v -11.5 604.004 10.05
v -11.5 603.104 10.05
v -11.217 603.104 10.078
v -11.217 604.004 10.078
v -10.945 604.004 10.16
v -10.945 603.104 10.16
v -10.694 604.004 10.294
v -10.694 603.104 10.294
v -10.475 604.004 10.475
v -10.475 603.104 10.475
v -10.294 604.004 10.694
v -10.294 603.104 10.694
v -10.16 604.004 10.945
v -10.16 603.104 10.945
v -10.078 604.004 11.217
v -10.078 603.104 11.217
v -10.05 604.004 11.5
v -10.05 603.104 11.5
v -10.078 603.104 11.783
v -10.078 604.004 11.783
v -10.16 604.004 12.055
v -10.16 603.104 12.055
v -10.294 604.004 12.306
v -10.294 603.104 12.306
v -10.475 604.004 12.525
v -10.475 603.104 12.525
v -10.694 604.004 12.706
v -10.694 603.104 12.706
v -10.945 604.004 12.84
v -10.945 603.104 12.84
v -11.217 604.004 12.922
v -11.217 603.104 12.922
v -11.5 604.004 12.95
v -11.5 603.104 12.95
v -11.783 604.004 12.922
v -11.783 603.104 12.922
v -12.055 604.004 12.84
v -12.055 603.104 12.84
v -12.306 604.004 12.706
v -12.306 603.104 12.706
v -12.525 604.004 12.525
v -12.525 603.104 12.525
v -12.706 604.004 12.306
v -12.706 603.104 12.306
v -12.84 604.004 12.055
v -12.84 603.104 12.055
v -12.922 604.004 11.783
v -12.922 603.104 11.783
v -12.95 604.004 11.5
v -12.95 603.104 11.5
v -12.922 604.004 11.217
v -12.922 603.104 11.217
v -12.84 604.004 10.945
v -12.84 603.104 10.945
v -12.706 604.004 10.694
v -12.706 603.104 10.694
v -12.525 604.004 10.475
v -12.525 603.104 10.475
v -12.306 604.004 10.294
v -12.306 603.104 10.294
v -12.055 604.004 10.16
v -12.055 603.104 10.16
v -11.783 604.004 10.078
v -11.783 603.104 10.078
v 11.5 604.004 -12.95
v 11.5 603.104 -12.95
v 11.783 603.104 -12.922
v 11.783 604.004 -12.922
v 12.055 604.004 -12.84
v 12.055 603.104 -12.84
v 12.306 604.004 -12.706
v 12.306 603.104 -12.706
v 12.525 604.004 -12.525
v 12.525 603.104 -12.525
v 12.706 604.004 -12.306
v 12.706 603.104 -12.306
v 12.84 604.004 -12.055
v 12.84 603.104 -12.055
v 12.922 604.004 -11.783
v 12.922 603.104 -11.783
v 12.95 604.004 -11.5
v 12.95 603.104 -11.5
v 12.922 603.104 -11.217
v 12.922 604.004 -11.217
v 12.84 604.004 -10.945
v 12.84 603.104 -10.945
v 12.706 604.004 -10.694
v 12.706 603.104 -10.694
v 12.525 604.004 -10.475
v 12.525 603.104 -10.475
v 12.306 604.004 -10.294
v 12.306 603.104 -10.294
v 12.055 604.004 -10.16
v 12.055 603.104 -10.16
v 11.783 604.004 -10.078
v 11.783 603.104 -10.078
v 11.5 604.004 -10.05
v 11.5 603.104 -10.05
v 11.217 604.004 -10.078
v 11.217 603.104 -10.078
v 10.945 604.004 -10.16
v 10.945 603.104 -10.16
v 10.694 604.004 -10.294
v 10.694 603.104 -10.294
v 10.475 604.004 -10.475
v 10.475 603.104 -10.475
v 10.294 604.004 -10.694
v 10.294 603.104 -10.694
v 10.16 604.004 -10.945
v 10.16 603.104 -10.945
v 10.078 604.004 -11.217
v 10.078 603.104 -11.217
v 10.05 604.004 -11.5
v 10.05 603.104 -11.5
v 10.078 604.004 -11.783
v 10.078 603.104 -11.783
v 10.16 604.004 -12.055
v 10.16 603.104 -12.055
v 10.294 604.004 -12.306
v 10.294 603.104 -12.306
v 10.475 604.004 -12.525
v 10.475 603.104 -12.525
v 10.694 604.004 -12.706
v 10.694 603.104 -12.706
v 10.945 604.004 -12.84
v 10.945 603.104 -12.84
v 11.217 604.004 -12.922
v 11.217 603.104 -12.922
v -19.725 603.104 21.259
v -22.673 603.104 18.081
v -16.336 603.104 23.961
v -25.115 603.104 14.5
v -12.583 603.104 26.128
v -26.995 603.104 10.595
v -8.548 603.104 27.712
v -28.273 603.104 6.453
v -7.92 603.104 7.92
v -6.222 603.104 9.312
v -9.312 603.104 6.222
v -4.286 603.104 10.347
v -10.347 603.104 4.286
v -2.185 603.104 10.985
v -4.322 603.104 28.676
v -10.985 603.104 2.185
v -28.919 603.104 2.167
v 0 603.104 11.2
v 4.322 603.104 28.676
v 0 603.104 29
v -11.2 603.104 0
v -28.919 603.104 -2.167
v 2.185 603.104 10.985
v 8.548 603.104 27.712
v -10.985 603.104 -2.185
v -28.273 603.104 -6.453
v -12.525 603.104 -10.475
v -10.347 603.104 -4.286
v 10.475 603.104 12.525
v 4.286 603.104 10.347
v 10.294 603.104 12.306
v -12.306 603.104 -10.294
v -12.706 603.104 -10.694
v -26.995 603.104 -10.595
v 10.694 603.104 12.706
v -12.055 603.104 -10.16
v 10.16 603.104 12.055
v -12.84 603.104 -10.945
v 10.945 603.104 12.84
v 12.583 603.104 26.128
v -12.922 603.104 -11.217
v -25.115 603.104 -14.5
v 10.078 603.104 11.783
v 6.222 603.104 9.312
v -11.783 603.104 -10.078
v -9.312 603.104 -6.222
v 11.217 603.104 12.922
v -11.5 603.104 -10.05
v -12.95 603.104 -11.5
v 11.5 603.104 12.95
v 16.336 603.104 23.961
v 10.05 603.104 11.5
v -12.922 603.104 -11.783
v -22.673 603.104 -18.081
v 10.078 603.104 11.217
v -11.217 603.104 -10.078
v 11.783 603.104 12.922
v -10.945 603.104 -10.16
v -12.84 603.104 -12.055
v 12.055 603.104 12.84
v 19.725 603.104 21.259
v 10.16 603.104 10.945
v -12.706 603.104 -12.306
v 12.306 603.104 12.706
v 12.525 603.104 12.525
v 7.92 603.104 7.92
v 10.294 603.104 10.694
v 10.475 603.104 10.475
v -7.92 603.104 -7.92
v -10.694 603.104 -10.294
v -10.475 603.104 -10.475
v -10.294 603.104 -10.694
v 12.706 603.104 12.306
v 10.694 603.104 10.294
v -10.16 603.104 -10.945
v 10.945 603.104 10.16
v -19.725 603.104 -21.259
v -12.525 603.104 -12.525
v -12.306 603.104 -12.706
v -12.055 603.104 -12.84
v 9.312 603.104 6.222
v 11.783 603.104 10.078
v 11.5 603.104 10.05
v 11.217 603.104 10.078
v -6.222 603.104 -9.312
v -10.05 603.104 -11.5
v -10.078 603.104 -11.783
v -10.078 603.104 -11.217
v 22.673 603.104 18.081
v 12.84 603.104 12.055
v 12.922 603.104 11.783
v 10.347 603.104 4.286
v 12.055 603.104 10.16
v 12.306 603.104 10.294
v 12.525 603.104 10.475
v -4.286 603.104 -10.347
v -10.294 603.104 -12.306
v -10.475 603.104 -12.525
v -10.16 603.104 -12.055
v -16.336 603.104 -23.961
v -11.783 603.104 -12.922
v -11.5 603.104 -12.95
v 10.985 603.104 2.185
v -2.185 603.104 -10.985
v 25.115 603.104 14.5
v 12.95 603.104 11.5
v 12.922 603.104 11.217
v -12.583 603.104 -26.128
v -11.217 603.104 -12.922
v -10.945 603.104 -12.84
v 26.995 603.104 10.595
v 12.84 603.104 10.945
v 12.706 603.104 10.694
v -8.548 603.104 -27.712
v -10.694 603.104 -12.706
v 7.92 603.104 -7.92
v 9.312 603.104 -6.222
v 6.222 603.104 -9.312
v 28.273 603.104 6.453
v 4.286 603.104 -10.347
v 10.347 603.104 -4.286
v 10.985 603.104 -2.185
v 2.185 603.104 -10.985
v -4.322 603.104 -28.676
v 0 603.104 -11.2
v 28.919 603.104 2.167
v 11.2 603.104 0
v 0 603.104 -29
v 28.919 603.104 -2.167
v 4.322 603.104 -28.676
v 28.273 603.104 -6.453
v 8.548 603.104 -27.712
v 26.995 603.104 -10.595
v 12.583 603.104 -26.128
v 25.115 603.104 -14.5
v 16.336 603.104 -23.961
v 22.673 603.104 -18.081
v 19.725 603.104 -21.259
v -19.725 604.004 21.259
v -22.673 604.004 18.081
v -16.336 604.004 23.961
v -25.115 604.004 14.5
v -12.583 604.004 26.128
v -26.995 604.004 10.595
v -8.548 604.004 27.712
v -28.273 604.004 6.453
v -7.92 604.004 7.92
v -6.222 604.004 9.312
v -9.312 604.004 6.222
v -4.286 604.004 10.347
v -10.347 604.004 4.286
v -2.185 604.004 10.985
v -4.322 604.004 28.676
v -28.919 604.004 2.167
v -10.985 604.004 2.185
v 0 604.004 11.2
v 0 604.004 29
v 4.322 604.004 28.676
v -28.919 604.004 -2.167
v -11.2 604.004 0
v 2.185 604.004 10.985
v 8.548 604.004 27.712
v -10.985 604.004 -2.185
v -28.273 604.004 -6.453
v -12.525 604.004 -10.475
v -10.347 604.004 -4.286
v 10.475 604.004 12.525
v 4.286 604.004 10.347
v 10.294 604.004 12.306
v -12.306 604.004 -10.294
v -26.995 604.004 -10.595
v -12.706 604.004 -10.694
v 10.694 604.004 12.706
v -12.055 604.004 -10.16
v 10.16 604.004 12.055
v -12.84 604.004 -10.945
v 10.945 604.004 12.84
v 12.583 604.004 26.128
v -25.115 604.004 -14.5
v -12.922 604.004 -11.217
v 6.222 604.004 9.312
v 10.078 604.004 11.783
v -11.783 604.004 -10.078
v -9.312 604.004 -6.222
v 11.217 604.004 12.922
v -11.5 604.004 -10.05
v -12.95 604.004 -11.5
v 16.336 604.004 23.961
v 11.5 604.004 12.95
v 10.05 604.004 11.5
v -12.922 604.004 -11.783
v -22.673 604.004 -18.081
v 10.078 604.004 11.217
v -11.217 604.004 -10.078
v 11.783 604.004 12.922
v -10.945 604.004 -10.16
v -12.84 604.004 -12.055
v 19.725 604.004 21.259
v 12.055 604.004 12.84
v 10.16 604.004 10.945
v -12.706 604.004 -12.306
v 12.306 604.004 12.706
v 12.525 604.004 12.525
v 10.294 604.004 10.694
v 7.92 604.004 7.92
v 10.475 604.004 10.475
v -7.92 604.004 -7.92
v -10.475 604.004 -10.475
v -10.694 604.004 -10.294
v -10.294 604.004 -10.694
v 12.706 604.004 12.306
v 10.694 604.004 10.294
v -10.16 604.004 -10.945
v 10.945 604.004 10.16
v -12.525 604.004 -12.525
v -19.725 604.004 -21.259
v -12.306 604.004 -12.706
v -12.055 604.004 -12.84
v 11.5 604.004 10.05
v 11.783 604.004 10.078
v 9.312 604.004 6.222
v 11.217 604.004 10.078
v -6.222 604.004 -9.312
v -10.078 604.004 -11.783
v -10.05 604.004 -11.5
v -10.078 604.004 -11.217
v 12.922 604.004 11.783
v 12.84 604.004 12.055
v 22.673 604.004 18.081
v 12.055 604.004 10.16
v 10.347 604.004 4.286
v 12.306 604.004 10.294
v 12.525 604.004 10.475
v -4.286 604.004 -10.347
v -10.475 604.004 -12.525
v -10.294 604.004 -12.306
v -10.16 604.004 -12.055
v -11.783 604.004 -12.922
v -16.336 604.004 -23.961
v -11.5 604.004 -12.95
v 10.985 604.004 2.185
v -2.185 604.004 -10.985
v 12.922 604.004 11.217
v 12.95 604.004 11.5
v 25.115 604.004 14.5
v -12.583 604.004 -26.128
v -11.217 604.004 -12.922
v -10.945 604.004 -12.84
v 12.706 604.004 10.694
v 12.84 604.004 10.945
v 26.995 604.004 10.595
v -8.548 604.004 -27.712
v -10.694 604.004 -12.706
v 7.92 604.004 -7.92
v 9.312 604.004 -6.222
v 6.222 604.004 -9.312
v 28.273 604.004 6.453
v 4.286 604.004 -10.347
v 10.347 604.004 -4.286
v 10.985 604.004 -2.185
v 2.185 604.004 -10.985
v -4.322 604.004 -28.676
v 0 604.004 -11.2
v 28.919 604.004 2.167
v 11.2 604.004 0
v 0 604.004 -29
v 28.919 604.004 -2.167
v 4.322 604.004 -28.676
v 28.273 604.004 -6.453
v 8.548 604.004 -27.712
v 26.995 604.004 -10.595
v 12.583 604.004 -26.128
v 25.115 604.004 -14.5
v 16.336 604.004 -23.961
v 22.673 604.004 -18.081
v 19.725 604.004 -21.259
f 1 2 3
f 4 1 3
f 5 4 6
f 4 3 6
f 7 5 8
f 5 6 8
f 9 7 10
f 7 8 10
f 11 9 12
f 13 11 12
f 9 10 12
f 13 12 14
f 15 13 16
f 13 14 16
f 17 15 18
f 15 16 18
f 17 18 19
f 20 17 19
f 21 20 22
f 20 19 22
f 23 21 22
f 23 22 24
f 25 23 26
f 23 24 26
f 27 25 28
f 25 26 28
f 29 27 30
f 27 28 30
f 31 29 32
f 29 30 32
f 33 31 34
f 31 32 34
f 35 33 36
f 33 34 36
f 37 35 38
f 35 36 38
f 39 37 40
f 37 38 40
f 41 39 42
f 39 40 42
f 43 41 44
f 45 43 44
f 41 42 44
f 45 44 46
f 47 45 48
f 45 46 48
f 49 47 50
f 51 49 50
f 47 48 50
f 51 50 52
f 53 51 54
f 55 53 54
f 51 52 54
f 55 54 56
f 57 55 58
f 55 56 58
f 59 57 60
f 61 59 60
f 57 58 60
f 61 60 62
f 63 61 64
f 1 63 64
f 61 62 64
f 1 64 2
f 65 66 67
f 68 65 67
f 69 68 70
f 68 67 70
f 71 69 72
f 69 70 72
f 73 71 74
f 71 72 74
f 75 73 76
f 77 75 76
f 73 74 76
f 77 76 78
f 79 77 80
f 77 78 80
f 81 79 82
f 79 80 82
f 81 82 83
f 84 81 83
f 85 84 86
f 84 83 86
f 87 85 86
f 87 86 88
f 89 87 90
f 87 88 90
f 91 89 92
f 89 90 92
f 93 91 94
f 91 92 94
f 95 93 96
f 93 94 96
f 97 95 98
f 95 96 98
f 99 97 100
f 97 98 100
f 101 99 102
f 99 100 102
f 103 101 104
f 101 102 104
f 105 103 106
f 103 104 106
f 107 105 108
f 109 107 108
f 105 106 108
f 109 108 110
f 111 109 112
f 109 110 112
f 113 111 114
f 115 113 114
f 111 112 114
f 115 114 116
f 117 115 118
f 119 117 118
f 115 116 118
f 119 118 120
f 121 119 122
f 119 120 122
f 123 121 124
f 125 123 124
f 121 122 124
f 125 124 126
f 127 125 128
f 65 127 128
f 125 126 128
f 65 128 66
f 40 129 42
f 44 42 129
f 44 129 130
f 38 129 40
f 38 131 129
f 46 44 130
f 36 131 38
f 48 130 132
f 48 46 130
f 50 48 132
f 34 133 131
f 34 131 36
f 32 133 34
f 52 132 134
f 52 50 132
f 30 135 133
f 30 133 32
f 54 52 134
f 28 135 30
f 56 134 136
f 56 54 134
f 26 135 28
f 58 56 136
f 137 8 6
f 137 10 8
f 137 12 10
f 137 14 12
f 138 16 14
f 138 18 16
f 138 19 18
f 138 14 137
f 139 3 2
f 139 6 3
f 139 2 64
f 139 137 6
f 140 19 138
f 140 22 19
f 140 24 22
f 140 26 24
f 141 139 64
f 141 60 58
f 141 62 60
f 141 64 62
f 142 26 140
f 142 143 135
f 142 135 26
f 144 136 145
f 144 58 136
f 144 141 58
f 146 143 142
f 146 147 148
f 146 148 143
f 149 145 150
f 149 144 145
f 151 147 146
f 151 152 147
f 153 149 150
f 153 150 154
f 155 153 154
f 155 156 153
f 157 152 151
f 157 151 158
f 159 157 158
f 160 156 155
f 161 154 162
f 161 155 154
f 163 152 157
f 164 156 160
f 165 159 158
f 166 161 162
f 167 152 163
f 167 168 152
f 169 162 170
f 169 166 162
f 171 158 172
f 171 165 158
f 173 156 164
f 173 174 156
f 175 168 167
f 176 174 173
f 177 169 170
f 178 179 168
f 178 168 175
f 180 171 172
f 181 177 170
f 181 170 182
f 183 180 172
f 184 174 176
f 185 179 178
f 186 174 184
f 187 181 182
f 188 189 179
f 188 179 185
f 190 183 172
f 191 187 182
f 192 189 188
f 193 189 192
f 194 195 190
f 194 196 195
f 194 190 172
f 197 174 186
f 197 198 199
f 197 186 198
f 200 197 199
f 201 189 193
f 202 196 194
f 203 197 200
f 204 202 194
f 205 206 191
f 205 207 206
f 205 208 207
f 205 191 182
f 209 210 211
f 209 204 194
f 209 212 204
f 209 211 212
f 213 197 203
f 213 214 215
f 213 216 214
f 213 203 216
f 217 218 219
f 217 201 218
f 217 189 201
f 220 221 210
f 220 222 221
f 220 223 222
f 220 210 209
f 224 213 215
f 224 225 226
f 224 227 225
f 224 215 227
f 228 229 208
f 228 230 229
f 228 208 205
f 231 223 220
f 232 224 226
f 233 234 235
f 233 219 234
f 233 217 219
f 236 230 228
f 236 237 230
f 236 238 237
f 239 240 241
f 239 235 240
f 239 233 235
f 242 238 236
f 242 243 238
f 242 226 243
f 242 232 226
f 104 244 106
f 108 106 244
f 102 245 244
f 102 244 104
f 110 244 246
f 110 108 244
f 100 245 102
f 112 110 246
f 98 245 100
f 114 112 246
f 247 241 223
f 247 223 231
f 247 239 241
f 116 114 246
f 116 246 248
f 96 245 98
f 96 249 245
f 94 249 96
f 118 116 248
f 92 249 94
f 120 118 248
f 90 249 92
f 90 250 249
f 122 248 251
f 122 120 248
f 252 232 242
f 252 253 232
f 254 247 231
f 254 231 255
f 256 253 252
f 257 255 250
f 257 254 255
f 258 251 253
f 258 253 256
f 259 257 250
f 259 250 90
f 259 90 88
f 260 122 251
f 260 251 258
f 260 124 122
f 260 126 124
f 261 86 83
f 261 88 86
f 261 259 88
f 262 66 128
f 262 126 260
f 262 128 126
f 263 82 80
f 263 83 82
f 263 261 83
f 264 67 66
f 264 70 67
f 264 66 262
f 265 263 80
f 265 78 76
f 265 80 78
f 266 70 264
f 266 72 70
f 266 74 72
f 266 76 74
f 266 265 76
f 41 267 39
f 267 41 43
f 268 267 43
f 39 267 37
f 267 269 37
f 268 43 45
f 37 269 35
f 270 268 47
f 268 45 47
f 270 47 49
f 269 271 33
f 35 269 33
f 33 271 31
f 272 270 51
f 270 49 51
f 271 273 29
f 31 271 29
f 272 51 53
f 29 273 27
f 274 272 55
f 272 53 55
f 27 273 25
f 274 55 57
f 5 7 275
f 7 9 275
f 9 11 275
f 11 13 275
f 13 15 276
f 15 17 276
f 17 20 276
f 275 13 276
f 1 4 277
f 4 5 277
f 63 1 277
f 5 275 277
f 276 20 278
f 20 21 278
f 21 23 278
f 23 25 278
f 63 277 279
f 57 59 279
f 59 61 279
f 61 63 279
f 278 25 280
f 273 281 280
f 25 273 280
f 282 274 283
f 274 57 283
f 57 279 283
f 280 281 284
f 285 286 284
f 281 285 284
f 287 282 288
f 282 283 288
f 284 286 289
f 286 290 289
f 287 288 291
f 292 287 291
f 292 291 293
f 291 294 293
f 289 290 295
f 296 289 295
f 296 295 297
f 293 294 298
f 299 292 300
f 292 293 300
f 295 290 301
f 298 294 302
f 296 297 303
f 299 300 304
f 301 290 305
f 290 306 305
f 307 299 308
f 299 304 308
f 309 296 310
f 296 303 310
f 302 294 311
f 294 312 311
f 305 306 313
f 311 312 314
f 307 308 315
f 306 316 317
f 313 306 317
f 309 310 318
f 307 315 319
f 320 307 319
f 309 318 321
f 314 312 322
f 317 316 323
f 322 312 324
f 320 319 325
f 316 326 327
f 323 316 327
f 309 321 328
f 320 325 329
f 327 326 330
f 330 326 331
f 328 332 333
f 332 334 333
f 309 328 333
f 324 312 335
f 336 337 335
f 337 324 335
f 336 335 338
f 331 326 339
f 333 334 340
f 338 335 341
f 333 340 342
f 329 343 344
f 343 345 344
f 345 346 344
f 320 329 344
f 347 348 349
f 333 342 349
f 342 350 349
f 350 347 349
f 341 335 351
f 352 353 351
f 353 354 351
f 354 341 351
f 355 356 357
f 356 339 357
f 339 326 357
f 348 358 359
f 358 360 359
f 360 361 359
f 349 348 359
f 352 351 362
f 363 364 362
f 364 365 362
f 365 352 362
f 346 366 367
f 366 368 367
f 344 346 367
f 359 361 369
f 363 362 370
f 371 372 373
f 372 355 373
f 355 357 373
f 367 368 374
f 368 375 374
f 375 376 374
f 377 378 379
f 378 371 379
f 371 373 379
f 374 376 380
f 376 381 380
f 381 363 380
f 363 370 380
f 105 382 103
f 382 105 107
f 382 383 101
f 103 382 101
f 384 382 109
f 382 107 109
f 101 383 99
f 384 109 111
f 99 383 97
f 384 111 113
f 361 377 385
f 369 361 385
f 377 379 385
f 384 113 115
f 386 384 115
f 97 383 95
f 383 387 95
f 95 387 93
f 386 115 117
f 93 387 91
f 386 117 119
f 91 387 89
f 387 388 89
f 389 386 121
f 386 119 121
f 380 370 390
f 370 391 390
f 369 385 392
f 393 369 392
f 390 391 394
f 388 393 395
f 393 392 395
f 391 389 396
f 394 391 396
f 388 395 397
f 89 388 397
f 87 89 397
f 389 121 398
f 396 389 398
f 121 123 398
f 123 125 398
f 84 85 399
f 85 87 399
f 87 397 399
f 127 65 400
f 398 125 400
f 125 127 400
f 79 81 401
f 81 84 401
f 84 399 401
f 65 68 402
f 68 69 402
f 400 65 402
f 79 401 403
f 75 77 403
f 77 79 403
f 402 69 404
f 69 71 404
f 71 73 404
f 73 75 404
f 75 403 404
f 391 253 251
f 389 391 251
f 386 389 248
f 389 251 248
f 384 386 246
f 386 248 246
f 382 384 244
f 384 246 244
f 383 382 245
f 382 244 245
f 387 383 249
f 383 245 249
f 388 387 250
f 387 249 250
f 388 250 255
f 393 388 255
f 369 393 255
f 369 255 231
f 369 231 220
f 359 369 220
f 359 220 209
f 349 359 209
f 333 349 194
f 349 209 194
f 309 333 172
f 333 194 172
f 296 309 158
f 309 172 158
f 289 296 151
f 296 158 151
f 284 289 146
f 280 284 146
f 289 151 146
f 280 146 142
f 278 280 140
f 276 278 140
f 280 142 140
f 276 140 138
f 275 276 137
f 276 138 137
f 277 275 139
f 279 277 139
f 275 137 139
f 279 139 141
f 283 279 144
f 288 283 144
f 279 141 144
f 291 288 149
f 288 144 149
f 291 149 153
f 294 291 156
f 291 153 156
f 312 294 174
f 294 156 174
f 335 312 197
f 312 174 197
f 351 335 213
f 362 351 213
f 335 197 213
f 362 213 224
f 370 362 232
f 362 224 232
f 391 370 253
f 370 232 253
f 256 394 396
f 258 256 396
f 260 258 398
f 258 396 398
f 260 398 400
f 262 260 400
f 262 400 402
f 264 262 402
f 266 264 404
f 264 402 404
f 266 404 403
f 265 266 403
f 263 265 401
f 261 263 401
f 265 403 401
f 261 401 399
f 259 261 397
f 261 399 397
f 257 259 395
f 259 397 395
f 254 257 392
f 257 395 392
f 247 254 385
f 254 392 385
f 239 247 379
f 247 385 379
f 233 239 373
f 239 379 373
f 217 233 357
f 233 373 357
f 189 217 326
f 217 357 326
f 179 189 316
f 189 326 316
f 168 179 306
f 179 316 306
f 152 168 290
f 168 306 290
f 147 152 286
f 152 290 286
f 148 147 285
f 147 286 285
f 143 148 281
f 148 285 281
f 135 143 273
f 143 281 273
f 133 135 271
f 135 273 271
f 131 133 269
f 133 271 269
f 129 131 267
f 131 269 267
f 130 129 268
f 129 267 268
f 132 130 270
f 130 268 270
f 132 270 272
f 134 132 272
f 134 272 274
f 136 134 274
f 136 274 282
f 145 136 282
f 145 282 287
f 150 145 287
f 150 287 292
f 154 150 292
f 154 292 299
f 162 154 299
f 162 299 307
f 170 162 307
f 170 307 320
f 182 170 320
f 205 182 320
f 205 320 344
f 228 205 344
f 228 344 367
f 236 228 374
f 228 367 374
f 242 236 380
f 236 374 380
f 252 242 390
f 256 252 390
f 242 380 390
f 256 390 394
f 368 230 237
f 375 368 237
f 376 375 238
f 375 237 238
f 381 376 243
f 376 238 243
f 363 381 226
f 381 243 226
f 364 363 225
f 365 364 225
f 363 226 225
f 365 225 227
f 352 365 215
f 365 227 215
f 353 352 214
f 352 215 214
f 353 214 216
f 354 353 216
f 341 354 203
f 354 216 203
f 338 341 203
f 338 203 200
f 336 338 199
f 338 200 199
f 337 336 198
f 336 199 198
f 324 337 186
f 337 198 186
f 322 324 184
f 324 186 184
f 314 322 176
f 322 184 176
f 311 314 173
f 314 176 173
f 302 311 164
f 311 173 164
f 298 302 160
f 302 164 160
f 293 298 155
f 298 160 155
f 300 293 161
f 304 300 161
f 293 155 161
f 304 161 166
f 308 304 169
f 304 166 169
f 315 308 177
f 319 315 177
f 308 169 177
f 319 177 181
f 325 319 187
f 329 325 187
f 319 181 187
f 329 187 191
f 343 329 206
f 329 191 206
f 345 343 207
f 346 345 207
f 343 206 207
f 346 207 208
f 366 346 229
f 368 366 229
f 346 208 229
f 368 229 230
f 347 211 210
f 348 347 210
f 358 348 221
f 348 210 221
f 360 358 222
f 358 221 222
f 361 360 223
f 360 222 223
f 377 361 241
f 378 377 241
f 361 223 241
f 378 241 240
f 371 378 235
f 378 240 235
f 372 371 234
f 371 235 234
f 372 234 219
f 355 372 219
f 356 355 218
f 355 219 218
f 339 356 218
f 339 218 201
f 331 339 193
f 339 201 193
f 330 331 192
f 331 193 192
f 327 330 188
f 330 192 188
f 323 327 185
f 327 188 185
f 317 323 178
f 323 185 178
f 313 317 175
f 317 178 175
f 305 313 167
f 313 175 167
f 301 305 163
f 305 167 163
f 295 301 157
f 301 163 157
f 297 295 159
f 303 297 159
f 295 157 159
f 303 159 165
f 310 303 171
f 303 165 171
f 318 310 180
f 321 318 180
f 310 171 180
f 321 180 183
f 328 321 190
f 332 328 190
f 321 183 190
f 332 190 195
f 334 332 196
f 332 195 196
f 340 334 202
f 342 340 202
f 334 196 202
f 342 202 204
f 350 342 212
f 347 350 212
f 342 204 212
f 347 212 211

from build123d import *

# Parameters (mm, degrees)
SKETCH_1_R          = 29
EXTRUDE_1_DEPTH     = 0.9
SKETCH_2_R          = 1.45
SKETCH_2_R_2        = 11.2
CUT_EXTRUDE_1_DEPTH = 0.9


with BuildPart() as part:
    # 草图1 → 凸台-拉伸1 (new body)
    with BuildSketch(Plane.XZ.offset(-604.003613165)):
        with Locations(Location((0, 0, 0), (0, 0, 270))):
            Circle(SKETCH_1_R)
    extrude(amount=EXTRUDE_1_DEPTH)

    # 草图2 → 切除-拉伸1 (cut)
    with BuildSketch(Plane.XZ.offset(-603.103613165)):
        with Locations(Location((11.5, -11.5, 0), (0, 0, 270))):
            Circle(SKETCH_2_R)
        with Locations(Location((-11.5, -11.5, 0), (0, 0, 270))):
            Circle(SKETCH_2_R)
        with Locations(Location((11.5, 11.5, 0), (0, 0, 270))):
            Circle(SKETCH_2_R)
        with Locations(Location((-11.5, 11.5, 0), (0, 0, 270))):
            Circle(SKETCH_2_R)
        with Locations(Location((0, 0, 0), (0, 0, 270))):
            Circle(SKETCH_2_R_2)
    extrude(amount=-CUT_EXTRUDE_1_DEPTH, mode=Mode.SUBTRACT)


solid = part.part
